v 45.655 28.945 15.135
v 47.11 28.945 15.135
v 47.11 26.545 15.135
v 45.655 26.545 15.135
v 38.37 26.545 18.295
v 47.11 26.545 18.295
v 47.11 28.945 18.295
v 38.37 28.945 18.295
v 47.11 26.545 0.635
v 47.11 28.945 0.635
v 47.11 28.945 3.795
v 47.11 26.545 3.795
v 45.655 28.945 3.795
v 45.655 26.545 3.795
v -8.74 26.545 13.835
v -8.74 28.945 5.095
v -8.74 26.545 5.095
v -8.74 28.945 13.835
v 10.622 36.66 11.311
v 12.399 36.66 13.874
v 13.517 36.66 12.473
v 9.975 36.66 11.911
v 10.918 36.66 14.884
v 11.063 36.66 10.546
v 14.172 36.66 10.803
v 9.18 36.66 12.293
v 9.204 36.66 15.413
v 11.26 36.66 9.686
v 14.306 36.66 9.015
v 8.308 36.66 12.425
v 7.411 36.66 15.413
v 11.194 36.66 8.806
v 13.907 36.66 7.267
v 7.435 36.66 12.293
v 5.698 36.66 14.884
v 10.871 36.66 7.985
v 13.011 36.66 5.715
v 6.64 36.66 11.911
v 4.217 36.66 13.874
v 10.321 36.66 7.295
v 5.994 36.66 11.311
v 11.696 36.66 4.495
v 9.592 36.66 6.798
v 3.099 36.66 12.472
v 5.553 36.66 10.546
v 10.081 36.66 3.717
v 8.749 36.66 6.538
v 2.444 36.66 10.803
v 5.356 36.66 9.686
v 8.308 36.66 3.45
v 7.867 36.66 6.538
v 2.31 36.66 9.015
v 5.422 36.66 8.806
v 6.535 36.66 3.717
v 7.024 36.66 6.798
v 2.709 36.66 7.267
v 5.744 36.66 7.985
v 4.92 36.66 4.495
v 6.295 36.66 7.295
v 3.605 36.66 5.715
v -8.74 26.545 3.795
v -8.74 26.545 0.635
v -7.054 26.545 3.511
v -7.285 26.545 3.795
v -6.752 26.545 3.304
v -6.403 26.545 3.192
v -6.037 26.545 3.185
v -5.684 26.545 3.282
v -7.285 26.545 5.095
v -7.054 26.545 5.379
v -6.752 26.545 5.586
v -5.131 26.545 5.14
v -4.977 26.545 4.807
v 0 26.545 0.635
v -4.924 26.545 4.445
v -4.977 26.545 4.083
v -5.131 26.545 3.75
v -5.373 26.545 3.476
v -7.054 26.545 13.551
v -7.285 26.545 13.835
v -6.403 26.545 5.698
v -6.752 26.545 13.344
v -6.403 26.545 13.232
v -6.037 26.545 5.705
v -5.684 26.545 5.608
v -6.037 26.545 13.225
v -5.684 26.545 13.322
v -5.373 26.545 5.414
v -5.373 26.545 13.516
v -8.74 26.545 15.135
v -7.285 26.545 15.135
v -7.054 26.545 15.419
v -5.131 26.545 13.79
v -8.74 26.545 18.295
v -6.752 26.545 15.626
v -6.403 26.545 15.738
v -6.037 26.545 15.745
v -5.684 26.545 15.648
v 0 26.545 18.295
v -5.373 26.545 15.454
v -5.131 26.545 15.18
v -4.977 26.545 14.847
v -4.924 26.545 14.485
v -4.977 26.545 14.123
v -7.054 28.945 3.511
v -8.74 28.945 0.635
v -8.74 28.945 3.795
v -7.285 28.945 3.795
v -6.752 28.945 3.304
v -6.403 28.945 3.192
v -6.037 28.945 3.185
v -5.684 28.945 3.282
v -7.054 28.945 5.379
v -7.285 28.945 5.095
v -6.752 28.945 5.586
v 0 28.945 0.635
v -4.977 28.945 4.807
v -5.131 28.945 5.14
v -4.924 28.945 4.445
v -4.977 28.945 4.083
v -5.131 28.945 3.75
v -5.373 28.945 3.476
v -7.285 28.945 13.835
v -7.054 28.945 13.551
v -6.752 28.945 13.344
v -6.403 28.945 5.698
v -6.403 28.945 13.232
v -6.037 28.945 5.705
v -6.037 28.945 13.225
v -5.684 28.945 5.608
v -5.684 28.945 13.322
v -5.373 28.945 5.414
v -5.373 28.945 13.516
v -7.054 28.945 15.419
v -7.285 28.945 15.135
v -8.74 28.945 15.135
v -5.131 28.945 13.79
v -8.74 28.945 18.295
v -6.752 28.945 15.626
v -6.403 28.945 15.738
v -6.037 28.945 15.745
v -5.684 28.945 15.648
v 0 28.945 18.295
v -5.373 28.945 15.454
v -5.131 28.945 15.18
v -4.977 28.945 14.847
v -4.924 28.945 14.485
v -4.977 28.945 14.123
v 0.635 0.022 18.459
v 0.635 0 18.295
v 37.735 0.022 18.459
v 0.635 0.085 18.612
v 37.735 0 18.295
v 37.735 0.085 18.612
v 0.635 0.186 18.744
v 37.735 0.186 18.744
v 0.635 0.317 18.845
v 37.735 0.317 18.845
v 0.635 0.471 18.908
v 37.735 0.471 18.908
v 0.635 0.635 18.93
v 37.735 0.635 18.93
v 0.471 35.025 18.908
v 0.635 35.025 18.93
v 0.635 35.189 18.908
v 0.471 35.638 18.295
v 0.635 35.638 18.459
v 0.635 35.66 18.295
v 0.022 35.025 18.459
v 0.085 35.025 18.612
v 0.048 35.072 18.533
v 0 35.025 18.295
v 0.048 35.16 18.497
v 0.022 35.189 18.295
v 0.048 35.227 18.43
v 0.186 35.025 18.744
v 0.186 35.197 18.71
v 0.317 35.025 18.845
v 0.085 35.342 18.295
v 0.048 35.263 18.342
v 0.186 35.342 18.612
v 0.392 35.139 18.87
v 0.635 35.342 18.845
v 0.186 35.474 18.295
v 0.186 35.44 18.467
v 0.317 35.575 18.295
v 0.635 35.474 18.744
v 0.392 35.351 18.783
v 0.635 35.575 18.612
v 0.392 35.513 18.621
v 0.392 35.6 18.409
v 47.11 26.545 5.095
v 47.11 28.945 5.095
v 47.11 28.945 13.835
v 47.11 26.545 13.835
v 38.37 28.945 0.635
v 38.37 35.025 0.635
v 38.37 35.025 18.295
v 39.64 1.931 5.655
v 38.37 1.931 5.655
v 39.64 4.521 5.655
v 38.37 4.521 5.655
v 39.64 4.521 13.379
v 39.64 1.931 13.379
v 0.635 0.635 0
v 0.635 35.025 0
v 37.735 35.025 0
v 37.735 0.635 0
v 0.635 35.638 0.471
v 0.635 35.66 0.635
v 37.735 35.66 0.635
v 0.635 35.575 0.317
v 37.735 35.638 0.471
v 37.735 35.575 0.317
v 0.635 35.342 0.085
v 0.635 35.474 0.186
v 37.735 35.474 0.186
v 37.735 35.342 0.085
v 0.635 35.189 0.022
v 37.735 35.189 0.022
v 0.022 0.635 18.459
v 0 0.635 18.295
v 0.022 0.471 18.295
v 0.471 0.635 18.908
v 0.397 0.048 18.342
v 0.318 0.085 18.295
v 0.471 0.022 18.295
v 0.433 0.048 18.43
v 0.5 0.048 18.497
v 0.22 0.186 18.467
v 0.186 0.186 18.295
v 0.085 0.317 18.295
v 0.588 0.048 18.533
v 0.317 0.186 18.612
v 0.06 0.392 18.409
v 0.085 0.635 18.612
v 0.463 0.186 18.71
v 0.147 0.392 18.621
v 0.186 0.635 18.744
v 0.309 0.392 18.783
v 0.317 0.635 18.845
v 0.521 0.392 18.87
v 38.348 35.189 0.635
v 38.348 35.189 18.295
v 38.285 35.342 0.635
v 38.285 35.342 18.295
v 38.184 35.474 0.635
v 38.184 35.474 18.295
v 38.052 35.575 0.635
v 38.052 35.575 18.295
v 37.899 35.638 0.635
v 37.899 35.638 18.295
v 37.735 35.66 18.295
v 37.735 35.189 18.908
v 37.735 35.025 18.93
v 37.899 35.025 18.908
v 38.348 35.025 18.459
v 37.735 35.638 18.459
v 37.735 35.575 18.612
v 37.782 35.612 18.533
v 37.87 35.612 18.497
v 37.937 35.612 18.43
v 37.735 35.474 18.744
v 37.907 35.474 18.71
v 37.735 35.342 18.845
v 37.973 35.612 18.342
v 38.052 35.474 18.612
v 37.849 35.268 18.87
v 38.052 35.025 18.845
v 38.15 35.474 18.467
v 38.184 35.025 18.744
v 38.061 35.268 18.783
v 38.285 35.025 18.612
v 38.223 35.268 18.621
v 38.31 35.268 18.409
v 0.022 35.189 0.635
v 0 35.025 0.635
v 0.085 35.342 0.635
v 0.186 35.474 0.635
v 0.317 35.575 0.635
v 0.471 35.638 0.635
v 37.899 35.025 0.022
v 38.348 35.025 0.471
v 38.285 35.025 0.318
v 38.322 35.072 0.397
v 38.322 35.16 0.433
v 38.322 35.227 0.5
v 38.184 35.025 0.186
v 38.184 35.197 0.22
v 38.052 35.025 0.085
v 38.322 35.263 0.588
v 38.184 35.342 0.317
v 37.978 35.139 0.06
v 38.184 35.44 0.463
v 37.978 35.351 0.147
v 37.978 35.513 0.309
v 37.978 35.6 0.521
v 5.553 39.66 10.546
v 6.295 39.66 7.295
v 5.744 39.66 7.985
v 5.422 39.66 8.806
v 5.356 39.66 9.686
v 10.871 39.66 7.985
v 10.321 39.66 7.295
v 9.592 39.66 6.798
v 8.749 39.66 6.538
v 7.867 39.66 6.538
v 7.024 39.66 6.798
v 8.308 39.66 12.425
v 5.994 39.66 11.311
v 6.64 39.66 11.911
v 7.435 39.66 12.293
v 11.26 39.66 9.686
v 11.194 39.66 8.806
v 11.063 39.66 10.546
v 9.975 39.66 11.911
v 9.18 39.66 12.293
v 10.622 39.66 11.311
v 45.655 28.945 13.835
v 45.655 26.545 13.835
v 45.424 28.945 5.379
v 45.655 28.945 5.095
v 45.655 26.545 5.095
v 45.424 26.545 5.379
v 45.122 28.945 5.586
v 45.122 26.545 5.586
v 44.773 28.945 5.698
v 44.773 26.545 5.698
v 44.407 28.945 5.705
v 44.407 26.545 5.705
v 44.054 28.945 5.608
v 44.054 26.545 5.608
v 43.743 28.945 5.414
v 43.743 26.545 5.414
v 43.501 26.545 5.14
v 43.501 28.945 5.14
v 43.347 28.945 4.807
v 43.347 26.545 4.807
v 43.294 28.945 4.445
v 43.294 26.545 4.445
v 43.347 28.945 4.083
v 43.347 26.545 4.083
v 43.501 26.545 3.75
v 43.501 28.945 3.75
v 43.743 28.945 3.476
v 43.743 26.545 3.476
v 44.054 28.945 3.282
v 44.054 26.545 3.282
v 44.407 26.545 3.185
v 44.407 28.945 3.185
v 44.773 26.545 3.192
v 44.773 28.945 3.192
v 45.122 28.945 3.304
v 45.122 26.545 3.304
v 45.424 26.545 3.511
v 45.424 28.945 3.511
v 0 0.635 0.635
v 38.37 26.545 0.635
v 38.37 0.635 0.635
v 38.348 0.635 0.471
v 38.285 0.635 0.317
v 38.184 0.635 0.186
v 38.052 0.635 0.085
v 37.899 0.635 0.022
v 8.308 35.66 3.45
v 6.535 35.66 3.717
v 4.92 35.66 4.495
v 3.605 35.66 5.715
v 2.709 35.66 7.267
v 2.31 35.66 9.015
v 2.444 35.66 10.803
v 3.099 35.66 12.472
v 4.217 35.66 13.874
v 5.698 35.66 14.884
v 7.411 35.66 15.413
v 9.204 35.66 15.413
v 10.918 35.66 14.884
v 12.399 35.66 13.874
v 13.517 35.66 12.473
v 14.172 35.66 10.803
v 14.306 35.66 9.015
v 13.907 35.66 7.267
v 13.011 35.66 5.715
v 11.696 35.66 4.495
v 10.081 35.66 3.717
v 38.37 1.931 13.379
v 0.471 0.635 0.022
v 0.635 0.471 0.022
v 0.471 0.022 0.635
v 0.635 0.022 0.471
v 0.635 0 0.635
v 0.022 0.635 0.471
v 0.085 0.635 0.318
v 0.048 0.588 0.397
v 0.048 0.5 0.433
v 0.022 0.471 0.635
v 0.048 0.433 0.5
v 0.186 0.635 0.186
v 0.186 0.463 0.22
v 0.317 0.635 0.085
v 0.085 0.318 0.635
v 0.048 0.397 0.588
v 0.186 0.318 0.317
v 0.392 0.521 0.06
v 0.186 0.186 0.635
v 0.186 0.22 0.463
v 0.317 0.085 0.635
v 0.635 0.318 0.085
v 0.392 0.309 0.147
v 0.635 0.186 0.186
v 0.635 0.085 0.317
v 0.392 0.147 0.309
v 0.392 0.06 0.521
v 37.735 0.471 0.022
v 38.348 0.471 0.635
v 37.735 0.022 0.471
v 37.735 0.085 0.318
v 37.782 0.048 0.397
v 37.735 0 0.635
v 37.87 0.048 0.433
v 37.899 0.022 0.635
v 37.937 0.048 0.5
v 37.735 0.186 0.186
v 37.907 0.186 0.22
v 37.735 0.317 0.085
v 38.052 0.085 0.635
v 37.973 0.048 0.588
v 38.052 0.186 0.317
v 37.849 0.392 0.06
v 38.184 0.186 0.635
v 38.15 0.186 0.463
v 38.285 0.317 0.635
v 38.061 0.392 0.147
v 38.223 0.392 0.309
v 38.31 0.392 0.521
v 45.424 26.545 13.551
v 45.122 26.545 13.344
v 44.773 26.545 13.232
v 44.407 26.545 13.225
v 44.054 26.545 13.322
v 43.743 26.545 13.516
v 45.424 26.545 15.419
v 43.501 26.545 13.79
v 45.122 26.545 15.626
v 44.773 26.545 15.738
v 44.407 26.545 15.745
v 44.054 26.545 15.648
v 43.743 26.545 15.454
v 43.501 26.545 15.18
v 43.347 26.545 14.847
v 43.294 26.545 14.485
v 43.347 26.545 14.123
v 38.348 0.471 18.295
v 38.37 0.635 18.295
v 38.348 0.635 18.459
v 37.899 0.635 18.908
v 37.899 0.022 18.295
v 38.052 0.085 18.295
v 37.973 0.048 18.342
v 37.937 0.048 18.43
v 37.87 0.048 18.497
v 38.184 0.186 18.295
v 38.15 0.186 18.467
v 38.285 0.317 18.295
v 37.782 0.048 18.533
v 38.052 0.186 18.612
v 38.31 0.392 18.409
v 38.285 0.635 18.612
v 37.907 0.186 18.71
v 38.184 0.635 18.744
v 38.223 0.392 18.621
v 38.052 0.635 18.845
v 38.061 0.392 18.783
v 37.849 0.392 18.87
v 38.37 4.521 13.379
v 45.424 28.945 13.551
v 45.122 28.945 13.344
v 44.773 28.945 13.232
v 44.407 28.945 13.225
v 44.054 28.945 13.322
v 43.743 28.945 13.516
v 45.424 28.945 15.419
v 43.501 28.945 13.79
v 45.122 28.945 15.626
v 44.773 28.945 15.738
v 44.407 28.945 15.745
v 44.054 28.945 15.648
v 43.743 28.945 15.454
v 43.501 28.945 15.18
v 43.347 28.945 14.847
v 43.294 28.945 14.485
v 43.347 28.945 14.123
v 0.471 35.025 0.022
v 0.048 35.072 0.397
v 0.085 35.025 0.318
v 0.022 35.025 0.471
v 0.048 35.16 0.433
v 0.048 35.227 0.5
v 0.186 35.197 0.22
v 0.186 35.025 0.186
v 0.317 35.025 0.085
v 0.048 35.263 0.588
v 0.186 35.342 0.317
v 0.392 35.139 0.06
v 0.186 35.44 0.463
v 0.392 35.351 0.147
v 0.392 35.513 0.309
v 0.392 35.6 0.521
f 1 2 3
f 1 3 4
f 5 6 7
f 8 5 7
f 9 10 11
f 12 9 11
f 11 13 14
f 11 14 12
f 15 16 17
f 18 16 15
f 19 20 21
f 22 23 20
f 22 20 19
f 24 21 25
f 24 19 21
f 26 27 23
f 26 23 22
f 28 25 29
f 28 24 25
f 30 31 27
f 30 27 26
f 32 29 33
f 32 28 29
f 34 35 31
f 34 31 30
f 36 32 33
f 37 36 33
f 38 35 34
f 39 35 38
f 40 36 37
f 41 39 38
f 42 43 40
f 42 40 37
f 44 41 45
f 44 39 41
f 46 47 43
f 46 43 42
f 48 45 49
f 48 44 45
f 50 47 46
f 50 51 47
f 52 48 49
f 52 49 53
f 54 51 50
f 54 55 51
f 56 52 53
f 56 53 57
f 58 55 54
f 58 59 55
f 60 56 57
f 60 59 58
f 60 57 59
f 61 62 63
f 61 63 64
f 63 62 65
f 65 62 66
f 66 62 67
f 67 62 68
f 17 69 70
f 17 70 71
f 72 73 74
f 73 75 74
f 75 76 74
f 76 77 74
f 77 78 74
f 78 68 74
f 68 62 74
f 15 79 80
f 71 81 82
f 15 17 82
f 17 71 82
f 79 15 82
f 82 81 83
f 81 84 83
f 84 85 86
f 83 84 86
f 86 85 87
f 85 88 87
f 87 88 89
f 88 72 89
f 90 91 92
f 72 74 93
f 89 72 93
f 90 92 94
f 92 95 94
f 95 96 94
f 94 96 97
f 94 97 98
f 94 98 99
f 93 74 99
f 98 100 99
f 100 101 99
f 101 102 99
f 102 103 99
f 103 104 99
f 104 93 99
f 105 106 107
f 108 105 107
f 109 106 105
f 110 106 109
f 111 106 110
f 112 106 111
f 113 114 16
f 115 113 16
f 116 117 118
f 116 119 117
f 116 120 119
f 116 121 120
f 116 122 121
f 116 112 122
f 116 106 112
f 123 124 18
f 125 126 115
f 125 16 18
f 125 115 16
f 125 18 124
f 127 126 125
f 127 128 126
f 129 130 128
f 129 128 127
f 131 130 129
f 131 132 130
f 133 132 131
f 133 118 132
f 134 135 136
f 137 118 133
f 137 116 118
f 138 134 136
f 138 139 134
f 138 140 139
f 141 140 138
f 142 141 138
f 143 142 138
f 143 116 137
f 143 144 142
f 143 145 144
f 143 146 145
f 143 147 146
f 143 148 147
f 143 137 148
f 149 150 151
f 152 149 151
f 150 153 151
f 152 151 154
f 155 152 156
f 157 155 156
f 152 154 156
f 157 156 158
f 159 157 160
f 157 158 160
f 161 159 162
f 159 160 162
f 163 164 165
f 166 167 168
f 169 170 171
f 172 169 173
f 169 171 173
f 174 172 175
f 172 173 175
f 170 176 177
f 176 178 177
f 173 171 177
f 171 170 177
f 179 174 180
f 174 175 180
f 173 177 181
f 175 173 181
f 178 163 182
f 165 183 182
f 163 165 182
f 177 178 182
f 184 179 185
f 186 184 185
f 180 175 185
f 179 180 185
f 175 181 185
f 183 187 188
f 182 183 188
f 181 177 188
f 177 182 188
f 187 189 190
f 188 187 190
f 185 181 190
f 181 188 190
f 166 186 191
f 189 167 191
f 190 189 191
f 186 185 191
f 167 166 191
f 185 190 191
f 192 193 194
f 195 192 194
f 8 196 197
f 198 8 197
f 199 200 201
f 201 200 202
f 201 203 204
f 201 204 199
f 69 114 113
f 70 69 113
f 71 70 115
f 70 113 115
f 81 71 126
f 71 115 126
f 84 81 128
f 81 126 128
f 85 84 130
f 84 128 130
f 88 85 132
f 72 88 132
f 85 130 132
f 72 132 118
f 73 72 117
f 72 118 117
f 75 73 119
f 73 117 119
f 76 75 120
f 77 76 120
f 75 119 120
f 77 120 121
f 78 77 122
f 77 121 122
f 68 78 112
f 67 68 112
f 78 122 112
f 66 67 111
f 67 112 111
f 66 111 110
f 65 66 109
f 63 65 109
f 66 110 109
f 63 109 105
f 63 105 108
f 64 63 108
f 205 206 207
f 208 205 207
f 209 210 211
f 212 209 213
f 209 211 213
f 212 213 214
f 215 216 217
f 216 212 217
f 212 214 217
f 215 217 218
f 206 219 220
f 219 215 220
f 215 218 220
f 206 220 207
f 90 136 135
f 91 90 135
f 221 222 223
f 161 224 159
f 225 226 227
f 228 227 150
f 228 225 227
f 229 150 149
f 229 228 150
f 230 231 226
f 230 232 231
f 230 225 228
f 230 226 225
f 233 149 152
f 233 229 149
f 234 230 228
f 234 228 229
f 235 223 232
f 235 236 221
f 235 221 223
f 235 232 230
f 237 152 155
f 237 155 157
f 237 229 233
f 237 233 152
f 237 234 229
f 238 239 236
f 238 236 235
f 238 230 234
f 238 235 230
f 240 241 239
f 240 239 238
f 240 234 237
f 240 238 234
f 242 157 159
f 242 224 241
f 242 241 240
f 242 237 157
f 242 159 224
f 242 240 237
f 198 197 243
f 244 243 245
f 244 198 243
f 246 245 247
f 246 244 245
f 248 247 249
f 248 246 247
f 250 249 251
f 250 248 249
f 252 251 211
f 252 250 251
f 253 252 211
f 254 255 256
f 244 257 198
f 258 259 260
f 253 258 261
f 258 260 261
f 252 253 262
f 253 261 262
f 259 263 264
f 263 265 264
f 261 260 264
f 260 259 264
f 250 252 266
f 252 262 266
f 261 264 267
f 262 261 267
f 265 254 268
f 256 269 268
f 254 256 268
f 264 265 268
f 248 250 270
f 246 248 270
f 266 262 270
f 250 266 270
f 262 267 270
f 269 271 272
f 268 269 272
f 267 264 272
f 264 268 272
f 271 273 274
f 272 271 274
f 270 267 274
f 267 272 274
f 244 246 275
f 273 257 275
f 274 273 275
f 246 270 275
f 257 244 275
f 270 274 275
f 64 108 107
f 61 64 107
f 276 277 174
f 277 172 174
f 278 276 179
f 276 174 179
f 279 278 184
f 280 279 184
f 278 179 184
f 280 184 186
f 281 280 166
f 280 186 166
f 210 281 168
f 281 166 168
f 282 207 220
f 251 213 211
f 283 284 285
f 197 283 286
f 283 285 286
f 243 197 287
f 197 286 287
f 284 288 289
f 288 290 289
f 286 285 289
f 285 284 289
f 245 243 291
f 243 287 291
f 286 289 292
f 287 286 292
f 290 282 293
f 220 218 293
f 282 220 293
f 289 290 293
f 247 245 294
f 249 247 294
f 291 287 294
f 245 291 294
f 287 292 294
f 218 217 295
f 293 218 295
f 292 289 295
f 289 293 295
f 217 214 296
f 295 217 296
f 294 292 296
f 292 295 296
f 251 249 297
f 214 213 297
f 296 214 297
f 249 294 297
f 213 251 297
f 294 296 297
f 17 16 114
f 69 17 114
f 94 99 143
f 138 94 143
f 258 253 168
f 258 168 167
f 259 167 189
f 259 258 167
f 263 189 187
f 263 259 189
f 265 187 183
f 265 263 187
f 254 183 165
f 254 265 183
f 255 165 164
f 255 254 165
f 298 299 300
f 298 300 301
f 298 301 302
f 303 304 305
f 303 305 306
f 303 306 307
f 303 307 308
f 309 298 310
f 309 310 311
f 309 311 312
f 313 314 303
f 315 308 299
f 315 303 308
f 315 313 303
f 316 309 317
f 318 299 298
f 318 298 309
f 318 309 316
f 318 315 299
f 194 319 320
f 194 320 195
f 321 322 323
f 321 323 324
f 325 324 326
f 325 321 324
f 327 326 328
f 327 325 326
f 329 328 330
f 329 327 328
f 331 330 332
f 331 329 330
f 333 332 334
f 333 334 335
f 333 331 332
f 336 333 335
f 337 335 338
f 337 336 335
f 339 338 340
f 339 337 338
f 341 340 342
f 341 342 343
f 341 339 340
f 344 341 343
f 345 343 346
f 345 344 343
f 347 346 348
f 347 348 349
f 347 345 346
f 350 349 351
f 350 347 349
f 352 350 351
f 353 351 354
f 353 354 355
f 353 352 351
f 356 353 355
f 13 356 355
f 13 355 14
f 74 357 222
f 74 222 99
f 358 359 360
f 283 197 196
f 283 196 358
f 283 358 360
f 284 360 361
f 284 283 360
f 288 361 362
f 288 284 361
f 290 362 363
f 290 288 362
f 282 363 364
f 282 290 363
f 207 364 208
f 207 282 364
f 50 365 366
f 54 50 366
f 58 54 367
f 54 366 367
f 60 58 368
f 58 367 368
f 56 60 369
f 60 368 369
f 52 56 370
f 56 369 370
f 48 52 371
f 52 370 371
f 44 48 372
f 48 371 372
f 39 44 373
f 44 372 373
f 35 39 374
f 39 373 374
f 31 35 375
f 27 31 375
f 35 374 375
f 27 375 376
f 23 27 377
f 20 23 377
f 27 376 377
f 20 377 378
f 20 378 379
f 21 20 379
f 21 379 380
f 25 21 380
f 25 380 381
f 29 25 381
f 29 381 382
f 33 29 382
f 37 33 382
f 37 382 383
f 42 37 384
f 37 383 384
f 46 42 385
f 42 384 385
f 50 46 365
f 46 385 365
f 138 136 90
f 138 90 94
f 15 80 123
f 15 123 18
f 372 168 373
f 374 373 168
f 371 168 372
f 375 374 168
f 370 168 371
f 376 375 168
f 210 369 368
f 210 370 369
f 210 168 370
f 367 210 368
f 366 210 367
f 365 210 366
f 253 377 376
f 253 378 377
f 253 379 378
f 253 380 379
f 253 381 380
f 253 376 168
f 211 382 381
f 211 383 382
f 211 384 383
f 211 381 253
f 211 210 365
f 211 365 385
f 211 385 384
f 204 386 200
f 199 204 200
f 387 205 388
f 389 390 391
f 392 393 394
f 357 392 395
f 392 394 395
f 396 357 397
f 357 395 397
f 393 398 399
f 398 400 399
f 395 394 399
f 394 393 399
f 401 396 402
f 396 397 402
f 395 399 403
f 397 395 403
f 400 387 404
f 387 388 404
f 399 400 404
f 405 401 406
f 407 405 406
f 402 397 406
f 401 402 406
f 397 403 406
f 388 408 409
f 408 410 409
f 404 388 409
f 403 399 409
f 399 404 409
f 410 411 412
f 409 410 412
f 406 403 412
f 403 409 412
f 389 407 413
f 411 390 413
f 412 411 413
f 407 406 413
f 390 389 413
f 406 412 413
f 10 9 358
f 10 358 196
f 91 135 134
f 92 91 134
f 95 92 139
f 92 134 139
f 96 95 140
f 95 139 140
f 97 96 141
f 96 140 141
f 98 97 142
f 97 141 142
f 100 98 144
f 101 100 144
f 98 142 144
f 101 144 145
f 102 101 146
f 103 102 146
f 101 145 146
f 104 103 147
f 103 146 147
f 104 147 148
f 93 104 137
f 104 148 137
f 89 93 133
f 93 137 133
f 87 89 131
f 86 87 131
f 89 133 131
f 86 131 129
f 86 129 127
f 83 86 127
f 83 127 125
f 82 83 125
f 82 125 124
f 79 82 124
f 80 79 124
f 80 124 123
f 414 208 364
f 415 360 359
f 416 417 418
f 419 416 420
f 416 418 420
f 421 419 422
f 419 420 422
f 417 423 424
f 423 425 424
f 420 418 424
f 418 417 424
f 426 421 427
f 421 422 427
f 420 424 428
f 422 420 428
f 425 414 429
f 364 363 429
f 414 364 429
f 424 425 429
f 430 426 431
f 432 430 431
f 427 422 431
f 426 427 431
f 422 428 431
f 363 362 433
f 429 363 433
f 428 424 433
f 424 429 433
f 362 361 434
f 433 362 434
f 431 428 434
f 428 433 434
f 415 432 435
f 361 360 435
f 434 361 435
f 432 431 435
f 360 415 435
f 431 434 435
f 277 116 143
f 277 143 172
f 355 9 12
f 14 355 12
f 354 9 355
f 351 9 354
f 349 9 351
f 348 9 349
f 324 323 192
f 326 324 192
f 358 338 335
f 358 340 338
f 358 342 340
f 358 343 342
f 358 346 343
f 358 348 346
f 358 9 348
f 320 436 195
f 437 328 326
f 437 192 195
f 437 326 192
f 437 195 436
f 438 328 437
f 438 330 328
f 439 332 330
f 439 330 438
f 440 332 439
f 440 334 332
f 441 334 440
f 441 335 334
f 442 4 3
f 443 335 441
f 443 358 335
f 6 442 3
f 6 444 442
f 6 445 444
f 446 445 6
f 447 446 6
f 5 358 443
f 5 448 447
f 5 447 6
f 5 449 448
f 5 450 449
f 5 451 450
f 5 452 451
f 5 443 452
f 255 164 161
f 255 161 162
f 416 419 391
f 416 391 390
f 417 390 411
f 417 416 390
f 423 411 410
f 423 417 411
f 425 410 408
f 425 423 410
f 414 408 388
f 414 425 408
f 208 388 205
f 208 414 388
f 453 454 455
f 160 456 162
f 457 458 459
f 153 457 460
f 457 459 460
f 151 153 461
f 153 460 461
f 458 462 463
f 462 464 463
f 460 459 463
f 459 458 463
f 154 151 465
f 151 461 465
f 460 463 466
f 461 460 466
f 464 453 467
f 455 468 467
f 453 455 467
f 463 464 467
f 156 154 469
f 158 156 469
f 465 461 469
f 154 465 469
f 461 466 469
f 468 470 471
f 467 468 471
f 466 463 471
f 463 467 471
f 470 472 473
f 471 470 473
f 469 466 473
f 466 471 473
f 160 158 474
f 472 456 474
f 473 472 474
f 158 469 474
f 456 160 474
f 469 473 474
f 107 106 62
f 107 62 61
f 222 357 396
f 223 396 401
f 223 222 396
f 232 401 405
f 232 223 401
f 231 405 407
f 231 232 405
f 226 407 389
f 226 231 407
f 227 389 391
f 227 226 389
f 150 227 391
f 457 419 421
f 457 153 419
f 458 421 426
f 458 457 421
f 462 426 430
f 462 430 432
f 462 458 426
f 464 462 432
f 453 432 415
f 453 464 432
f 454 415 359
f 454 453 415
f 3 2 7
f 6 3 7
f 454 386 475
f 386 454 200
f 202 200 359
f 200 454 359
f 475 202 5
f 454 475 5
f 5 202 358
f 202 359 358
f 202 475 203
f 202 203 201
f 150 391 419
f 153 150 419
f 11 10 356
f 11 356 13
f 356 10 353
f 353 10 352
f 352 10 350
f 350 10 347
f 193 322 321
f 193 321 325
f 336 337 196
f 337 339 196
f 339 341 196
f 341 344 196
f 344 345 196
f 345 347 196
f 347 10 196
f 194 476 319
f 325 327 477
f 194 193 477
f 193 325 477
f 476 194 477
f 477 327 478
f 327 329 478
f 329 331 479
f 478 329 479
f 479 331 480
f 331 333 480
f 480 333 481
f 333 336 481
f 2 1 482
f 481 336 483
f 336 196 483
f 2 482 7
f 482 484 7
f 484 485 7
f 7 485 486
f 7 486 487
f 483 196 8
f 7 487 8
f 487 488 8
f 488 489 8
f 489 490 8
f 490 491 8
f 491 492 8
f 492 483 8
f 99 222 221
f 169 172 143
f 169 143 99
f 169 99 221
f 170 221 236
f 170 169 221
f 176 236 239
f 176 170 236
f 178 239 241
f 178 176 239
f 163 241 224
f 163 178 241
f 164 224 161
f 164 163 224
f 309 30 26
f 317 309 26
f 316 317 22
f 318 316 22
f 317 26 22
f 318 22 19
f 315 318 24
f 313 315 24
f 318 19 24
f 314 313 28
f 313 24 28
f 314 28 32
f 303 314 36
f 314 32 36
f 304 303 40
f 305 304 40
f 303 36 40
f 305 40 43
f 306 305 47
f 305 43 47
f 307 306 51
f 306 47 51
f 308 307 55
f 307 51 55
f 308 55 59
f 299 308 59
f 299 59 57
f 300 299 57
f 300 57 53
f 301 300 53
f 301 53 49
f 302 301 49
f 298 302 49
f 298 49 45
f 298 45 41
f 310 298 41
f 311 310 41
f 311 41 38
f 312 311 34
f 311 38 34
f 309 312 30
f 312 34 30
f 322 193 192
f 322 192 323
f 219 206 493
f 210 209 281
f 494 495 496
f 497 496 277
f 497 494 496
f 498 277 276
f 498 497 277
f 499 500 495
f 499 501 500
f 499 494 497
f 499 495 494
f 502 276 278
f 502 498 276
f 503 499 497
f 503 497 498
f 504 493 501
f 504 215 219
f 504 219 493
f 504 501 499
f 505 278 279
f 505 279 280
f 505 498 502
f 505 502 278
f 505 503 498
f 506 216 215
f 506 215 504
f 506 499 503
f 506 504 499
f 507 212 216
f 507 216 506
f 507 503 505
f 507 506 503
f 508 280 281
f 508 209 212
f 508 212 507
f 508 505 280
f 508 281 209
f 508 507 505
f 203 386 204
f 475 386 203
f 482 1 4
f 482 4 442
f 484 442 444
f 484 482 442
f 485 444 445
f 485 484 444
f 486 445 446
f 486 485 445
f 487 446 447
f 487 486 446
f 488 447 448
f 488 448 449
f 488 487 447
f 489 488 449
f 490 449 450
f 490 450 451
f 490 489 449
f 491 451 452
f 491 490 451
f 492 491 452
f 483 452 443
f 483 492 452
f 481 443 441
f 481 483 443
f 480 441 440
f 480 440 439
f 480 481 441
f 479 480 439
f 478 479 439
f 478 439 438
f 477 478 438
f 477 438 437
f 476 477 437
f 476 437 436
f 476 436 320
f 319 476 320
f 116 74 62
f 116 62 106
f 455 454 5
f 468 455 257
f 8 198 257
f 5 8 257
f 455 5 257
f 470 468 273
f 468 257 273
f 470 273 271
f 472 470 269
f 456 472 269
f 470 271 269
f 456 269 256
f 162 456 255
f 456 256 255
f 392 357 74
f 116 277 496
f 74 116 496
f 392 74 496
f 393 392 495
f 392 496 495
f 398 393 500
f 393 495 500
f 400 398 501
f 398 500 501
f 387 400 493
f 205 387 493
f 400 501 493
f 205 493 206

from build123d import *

# Parameters (mm, degrees)
SKETCH1_W           = 38.37
SKETCH1_H           = 35.66
BOSS_EXTRUDE1_DEPTH = 18.93
FILLET1_R           = 0.635
SKETCH3_W           = 17.66
SKETCH3_H           = 2.4
BOSS_EXTRUDE2_DEPTH = 8.74
SKETCH5_R           = 6.015
BOSS_EXTRUDE3_DEPTH = 1
SKETCH7_R           = 2.96
BOSS_EXTRUDE4_DEPTH = 3
SKETCH8_W           = 7.723506563
SKETCH8_H           = 2.58982052
BOSS_EXTRUDE5_DEPTH = 1.27
CUT_EXTRUDE1_REACH  = 54.607


with BuildPart() as part:
    # Sketch1 → Boss-Extrude1 (new body)
    with BuildSketch(Plane.XY):
        with Locations((19.185, 17.83)):
            Rectangle(SKETCH1_W, SKETCH1_H)
    extrude(amount=BOSS_EXTRUDE1_DEPTH)

    # Fillet1
    fillet1_edges = [part.edges().sort_by_distance(p)[0] for p in [
        (38.37, 17.83, 18.93),
        (19.185, 35.66, 18.93),
        (0, 17.83, 18.93),
        (19.185, 35.66, 0),
        (38.37, 17.83, 0),
        (19.185, 0, 0),
        (0, 17.83, 0),
        (0, 35.66, 9.465),
        (38.37, 35.66, 9.465),
        (38.37, 0, 9.465),
        (0, 0, 9.465),
        (19.185, 0, 18.93),
    ]]
    fillet(fillet1_edges, radius=FILLET1_R)

    # Sketch3 → Boss-Extrude2 (add)
    with BuildSketch(Plane.ZY):
        with Locations((9.465, 27.745)):
            Rectangle(SKETCH3_W, SKETCH3_H)
    boss_extrude2 = extrude(amount=BOSS_EXTRUDE2_DEPTH)

    # Sketch5 → Boss-Extrude3 (add)
    with BuildSketch(Plane(origin=(0, 35.66, 0), x_dir=(1, 0, 0), z_dir=(0, 1, 0))):
        with Locations(Location((8.307888536, -9.465, 0), (0, 0, 90))):
            Circle(SKETCH5_R)
    extrude(amount=BOSS_EXTRUDE3_DEPTH)

    # Sketch7 → Boss-Extrude4 (add)
    with BuildSketch(Plane(origin=(0, 36.66, 0), x_dir=(1, 0, 0), z_dir=(0, 1, 0))):
        with Locations(Location((8.307888536, -9.465, 0), (0, 0, 270))):
            Circle(SKETCH7_R)
    extrude(amount=BOSS_EXTRUDE4_DEPTH)

    # Sketch8 → Boss-Extrude5 (add)
    with BuildSketch(Plane(origin=(38.37, 0, 0), x_dir=(0, 0, -1), z_dir=(1, 0, 0))):
        with Locations((-9.516753281, 3.226372892)):
            Rectangle(SKETCH8_W, SKETCH8_H)
    extrude(amount=BOSS_EXTRUDE5_DEPTH)

    # Sketch9 → Cut-Extrude1 (cut, up to next)
    with BuildSketch(Plane(origin=(0, 28.945, 0), x_dir=(1, 0, 0), z_dir=(0, 1, 0)), mode=Mode.PRIVATE) as cut_extrude1_sk1:
        with BuildLine():
            Line((-8.74, -5.094883425), (-7.285254756, -5.094883425))
            ThreePointArc((-7.285254756, -5.094883425), (-4.924130779, -4.445001135), (-7.285253595, -3.795114625))
            Line((-7.285253595, -3.795114625), (-8.74, -3.795114625))
            Line((-8.74, -3.795114625), (-8.74, -5.094883425))
        make_face()
    cut_extrude1_tool1 = extrude(cut_extrude1_sk1.sketch, amount=-CUT_EXTRUDE1_REACH, mode=Mode.PRIVATE) & part.part
    # Sketch9 → Cut-Extrude1 (cut, up to next)
    with BuildSketch(Plane(origin=(0, 28.945, 0), x_dir=(1, 0, 0), z_dir=(0, 1, 0)), mode=Mode.PRIVATE) as cut_extrude1_sk2:
        with BuildLine():
            Line((-8.74, -13.835116616), (-8.74, -15.134883384))
            Line((-8.74, -15.134883384), (-7.285254781, -15.134883384))
            ThreePointArc((-7.285254781, -15.134883384), (-4.924130779, -14.485), (-7.285254781, -13.835116616))
            Line((-7.285254781, -13.835116616), (-8.74, -13.835116616))
        make_face()
    cut_extrude1_tool2 = extrude(cut_extrude1_sk2.sketch, amount=-CUT_EXTRUDE1_REACH, mode=Mode.PRIVATE) & part.part
    cut_extrude1_1 = cut_extrude1_tool1.solids().sort_by_distance((-6.672838, 28.945, 4.445))[0]
    add(cut_extrude1_1, mode=Mode.SUBTRACT)
    cut_extrude1_2 = cut_extrude1_tool2.solids().sort_by_distance((-6.672837, 28.945, 14.485))[0]
    add(cut_extrude1_2, mode=Mode.SUBTRACT)
    cut_extrude1 = cut_extrude1_1 + cut_extrude1_2  # Cut-Extrude1 as one shape, for the pattern or mirror that repeats it

    # Mirror3: Boss-Extrude2, Cut-Extrude1 across plane
    add(boss_extrude2.mirror(Plane.ZY.offset(-19.185)))
    add(cut_extrude1.mirror(Plane.ZY.offset(-19.185)), mode=Mode.SUBTRACT)


solid = part.part
